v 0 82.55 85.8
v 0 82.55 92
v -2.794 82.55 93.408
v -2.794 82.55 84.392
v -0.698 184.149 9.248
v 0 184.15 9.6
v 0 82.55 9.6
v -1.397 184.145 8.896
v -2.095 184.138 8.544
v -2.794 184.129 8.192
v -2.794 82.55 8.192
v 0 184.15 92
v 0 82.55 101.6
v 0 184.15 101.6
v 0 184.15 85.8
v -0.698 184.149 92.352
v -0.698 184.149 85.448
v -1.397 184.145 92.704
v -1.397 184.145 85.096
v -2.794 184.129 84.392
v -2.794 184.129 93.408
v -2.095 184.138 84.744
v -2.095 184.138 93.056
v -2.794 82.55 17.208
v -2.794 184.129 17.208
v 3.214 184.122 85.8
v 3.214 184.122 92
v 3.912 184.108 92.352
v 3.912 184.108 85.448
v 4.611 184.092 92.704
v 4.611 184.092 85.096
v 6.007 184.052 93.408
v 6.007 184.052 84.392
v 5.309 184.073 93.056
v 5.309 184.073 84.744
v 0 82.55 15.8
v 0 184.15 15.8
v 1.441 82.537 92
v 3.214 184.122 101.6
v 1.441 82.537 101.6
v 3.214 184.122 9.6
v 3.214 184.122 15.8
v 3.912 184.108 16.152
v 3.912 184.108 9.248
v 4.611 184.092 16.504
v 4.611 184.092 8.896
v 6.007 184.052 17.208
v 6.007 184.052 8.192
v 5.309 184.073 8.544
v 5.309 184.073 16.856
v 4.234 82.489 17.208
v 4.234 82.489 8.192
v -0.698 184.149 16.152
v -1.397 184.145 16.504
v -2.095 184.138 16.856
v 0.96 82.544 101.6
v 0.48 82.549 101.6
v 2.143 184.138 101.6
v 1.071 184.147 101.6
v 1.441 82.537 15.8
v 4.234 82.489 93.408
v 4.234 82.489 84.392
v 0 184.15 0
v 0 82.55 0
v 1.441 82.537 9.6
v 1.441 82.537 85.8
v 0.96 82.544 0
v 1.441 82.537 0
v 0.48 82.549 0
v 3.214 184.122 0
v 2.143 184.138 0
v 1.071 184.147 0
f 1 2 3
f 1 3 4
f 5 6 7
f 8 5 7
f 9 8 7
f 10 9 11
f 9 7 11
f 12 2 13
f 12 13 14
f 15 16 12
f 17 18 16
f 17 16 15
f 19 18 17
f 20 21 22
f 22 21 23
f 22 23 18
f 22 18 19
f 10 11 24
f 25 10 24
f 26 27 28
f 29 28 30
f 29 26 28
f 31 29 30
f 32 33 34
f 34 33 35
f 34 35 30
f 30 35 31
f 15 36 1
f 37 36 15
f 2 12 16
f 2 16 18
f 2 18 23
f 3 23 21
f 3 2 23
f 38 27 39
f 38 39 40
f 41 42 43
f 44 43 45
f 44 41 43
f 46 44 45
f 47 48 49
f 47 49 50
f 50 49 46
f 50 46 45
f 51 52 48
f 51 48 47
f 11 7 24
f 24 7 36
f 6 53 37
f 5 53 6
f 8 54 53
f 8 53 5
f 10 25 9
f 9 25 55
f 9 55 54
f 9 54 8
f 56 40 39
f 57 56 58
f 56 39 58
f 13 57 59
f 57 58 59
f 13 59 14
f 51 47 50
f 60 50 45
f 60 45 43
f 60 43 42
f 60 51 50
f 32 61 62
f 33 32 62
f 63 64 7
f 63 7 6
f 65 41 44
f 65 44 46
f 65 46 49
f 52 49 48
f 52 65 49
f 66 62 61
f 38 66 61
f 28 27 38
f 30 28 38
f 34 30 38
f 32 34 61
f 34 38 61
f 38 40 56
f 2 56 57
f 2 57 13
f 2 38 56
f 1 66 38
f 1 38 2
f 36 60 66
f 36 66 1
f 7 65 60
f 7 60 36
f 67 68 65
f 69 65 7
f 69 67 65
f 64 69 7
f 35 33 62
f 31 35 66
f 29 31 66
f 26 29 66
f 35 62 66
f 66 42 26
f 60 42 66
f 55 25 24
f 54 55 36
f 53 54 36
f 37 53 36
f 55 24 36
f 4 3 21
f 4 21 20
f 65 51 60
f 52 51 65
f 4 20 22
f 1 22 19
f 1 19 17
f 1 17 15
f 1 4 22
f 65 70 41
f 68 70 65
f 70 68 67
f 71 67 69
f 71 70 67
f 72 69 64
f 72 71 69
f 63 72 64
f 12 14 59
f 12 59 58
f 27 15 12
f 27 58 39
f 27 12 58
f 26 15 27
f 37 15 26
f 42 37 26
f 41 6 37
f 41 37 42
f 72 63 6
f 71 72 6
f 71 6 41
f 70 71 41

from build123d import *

# Parameters (mm, degrees)
BOSS_EXTRUDE1_DEPTH      = 101.6
BOSS_EXTRUDE2_REACH      = 145.704
BOSS_EXTRUDE2_END_RADIUS = 184.15
BOSS_EXTRUDE3_REACH      = 145.81
BOSS_EXTRUDE3_END_RADIUS = 184.15


with BuildPart() as part:
    # Sketch1 → Boss-Extrude1 (new body)
    with BuildSketch(Plane.XY):
        with BuildLine():
            Line((0, 82.55), (0, 184.15))
            ThreePointArc((0, 184.15), (1.606991512, 184.142988132), (3.213860645, 184.121953063))
            Line((3.213860645, 184.121953063), (1.440696151, 82.537427235))
            ThreePointArc((1.440696151, 82.537427235), (0.720375505, 82.546856749), (0, 82.55))
        make_face()
    extrude(amount=BOSS_EXTRUDE1_DEPTH)

    # Boss-Extrude2: up to this cylinder (the profile starts inside it)
    boss_extrude2_end = Plane(origin=(0, 0, 50.8), z_dir=(0, 0, -1)) * Cylinder(BOSS_EXTRUDE2_END_RADIUS, 736.908, mode=Mode.PRIVATE)
    # Sketch2 → Boss-Extrude2 (add, up to the surface)
    with BuildSketch(Plane(origin=(1.440696151, 82.537427235, 0), x_dir=(0, 0, -1), z_dir=(-0.017452406437283546, -0.9998476951563914, 0)), mode=Mode.PRIVATE) as boss_extrude2_sk1:
        Polygon((-92.000208065, 0), (-93.4085, 2.794), (-84.3915, 2.794), (-85.799791935, 0), align=None)
    boss_extrude2_tool1 = extrude(boss_extrude2_sk1.sketch, amount=-BOSS_EXTRUDE2_REACH, mode=Mode.PRIVATE) & boss_extrude2_end
    add(boss_extrude2_tool1.solids().sort_by_distance((2.92366, 82.511542, 88.9))[0])
    # Sketch2 → Boss-Extrude2 (add, up to the surface)
    with BuildSketch(Plane(origin=(1.440696151, 82.537427235, 0), x_dir=(0, 0, -1), z_dir=(-0.017452406437283546, -0.9998476951563914, 0)), mode=Mode.PRIVATE) as boss_extrude2_sk2:
        Polygon((-15.800208065, 0), (-9.599791935, 0), (-8.1915, 2.794), (-17.2085, 2.794), align=None)
    boss_extrude2_tool2 = extrude(boss_extrude2_sk2.sketch, amount=-BOSS_EXTRUDE2_REACH, mode=Mode.PRIVATE) & boss_extrude2_end
    add(boss_extrude2_tool2.solids().sort_by_distance((2.92366, 82.511542, 12.7))[0])

    # Boss-Extrude3: up to this cylinder (the profile starts inside it)
    boss_extrude3_end = Plane(origin=(0, 0, 50.8), z_dir=(0, 0, -1)) * Cylinder(BOSS_EXTRUDE3_END_RADIUS, 737.12, mode=Mode.PRIVATE)
    # Sketch3 → Boss-Extrude3 (add, up to the surface)
    with BuildSketch(Plane(origin=(0, 82.55, 0), x_dir=(0, 0, -1), z_dir=(0, -1, 0)), mode=Mode.PRIVATE) as boss_extrude3_sk1:
        Polygon((-92.000208065, 0), (-93.4085, -2.79357446), (-84.3915, -2.79357446), (-85.799791935, 0), align=None)
    boss_extrude3_tool1 = extrude(boss_extrude3_sk1.sketch, amount=-BOSS_EXTRUDE3_REACH, mode=Mode.PRIVATE) & boss_extrude3_end
    add(boss_extrude3_tool1.solids().sort_by_distance((-1.482964, 82.55, 88.9))[0])
    # Sketch3 → Boss-Extrude3 (add, up to the surface)
    with BuildSketch(Plane(origin=(0, 82.55, 0), x_dir=(0, 0, -1), z_dir=(0, -1, 0)), mode=Mode.PRIVATE) as boss_extrude3_sk2:
        Polygon((-15.800208065, 0), (-9.599791935, 0), (-8.1915, -2.79357446), (-17.2085, -2.79357446), align=None)
    boss_extrude3_tool2 = extrude(boss_extrude3_sk2.sketch, amount=-BOSS_EXTRUDE3_REACH, mode=Mode.PRIVATE) & boss_extrude3_end
    add(boss_extrude3_tool2.solids().sort_by_distance((-1.482964, 82.55, 12.7))[0])


solid = part.part
